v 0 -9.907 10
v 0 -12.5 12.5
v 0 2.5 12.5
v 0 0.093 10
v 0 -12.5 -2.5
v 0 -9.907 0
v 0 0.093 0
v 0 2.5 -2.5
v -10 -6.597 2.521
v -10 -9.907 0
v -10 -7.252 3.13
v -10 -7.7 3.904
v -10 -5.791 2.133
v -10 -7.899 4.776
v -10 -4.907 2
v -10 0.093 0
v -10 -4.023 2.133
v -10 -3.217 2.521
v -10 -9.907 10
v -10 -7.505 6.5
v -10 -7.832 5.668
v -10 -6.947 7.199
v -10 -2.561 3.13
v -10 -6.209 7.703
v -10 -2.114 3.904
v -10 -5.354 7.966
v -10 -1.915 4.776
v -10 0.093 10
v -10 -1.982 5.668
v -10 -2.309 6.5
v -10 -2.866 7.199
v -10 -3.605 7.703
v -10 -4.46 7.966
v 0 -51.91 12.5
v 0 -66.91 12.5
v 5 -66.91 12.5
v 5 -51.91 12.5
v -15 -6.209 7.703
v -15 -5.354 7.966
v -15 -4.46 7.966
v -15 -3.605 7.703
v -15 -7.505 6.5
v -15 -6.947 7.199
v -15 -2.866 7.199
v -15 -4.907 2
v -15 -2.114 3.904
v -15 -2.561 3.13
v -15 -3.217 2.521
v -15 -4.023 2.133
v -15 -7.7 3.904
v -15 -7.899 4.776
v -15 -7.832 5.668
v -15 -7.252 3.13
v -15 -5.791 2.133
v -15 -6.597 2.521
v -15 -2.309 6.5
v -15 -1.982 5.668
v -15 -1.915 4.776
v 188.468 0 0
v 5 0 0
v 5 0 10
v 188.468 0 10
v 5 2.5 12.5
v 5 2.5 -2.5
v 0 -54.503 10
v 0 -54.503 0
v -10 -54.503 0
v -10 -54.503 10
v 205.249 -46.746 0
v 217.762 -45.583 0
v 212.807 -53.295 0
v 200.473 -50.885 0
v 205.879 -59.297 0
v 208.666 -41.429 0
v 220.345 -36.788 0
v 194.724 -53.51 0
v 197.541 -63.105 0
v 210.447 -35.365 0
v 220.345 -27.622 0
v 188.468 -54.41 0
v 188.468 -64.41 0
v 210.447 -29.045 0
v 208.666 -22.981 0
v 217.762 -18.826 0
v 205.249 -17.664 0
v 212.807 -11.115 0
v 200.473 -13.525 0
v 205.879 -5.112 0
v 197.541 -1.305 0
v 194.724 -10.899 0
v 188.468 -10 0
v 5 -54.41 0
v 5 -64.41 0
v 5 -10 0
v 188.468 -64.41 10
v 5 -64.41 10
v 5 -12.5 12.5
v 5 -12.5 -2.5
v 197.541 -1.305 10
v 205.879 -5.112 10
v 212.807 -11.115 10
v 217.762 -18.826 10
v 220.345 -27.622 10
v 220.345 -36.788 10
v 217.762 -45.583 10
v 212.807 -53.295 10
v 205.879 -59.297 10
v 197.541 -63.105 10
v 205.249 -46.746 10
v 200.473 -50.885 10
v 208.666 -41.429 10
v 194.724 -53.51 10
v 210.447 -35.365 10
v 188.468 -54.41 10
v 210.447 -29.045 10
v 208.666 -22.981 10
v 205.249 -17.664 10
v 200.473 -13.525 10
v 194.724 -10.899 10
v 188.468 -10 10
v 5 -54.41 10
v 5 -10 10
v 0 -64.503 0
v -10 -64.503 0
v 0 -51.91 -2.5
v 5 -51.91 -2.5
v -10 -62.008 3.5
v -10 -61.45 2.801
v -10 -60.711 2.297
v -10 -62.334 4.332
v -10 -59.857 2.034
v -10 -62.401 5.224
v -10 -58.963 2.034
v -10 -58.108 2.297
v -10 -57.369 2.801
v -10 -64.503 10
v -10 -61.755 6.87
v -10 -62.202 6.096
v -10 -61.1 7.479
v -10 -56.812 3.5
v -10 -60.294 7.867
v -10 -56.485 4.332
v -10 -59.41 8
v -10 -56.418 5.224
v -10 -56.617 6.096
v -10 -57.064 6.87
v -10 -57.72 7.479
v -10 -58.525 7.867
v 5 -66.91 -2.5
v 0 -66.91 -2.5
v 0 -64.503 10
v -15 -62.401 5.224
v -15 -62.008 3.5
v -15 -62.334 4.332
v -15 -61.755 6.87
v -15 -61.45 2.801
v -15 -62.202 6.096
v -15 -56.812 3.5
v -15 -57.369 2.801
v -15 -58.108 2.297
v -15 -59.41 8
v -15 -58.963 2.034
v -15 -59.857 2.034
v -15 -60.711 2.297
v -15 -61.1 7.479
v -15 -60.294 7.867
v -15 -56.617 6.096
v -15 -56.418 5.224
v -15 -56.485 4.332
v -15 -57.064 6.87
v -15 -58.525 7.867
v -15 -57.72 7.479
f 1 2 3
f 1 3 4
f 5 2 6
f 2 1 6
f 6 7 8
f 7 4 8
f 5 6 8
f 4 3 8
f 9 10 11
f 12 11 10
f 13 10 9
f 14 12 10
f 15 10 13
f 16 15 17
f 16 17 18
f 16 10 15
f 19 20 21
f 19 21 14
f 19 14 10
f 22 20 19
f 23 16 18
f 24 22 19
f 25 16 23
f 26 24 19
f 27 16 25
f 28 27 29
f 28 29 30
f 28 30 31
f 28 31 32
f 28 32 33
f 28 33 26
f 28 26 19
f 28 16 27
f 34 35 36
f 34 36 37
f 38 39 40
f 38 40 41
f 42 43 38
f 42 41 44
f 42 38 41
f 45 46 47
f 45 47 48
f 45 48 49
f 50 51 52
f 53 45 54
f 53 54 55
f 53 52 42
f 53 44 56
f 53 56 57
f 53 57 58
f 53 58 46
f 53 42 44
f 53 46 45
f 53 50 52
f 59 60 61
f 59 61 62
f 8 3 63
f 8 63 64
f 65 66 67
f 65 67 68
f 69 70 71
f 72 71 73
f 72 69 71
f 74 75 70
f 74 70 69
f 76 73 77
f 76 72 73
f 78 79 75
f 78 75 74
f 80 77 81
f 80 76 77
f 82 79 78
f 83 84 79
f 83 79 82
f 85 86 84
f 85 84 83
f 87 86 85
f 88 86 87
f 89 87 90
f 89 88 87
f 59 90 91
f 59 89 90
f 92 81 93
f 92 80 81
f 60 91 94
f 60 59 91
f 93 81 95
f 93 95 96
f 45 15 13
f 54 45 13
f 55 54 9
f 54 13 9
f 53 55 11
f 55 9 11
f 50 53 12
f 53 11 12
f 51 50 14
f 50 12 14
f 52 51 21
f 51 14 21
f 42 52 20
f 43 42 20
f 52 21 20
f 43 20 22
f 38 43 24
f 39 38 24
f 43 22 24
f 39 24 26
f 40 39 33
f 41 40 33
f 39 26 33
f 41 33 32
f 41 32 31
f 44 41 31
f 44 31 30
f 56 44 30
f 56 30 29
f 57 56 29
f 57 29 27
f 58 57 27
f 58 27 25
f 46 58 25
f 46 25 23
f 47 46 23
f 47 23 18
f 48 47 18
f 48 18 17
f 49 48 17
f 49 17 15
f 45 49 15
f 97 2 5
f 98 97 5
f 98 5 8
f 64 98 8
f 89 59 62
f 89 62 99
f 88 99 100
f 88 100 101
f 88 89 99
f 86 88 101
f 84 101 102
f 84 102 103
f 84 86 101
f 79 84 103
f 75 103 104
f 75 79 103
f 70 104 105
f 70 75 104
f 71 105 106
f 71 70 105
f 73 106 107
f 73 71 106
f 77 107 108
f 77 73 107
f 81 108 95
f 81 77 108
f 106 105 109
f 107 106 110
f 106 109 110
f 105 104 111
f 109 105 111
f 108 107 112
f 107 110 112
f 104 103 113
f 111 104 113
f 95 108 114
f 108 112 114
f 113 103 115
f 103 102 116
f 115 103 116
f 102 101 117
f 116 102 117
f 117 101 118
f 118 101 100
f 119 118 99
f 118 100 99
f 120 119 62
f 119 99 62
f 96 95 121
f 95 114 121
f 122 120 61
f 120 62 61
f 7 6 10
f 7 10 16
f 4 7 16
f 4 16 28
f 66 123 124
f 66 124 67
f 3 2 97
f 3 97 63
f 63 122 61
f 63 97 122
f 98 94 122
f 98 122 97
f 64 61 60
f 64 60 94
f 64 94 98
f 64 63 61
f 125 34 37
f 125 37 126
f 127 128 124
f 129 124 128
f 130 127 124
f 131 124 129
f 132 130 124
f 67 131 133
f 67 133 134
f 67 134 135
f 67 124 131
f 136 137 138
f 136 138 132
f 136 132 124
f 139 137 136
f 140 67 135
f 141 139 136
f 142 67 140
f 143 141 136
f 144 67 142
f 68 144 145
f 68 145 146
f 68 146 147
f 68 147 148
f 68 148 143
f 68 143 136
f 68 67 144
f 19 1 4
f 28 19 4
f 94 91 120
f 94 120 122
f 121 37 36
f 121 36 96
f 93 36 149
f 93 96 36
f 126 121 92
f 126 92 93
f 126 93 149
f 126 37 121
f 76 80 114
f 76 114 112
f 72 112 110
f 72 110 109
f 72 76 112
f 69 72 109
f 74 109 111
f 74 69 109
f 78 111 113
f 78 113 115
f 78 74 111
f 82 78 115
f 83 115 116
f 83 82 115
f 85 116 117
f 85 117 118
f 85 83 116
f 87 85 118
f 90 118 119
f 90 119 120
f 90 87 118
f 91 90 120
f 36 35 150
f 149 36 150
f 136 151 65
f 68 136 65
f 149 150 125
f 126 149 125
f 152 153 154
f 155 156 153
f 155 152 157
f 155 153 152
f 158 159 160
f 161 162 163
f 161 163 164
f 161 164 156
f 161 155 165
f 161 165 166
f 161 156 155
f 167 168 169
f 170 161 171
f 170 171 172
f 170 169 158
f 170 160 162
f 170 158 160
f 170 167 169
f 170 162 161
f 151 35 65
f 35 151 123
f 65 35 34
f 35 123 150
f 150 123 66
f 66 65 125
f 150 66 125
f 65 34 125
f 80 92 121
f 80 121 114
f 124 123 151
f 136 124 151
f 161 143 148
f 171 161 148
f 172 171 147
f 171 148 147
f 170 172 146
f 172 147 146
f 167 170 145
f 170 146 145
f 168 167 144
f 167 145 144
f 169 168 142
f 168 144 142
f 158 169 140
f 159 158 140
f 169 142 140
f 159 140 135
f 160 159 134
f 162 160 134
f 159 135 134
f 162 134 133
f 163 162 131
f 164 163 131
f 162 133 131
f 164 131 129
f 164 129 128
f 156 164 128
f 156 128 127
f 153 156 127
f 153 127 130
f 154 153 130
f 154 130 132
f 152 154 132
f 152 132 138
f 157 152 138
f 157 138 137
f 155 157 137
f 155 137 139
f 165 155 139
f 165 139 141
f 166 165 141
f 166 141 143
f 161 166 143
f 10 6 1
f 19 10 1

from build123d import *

# Parameters (mm, degrees)
BOSS_EXTRUDE1_DEPTH   = 10
SKETCH2_R             = 3
BOSS_EXTRUDE2_DEPTH   = 15
SKETCH3_R             = 3
BOSS_EXTRUDE3_DEPTH   = 15
SKETCH5_W             = 15
SKETCH5_H             = 15
BOSS_EXTRUDE4_DEPTH   = 5
BOSS_EXTRUDE4_2_DEPTH = 5
SKETCH7_W             = 10
SKETCH7_H             = 10
BOSS_EXTRUDE5_DEPTH   = 10


with BuildPart() as part:
    # Sketch1 → Boss-Extrude1 (new body)
    with BuildSketch(Plane.XY):
        with BuildLine():
            Line((0, 0), (188.467924539, 0))
            ThreePointArc((188.467924539, 0), (220.672766762, -32.204842223), (188.467924539, -64.409684446))
            Line((188.467924539, -64.409684446), (0, -64.409684446))
            Line((0, -64.409684446), (0, -54.409684446))
            Line((0, -54.409684446), (188.467924539, -54.409684446))
            ThreePointArc((188.467924539, -54.409684446), (210.672766762, -32.204842223), (188.467924539, -10))
            Line((188.467924539, -10), (0, -10))
            Line((0, -10), (0, 0))
        make_face()
    extrude(amount=BOSS_EXTRUDE1_DEPTH)

    # Sketch2 → Boss-Extrude2 (add)
    with BuildSketch(Plane.ZY):
        with Locations(Location((5, -4.906979909, 0), (0, 0, 180))):
            Circle(SKETCH2_R)
    extrude(amount=BOSS_EXTRUDE2_DEPTH)



with BuildPart() as body_2:
    # Sketch3 → Boss-Extrude3 (new body)
    with BuildSketch(Plane.ZY):
        with Locations((5, -59.409684446)):
            Circle(SKETCH3_R)
    extrude(amount=BOSS_EXTRUDE3_DEPTH)


with BuildPart() as body_3:
    # Sketch5 → Boss-Extrude4 (new body)
    with BuildSketch(Plane(origin=(0, 0, 0), x_dir=(0, 0, -1), z_dir=(1, 0, 0))):
        with Locations((-5, -59.409684446)):
            Rectangle(SKETCH5_W, SKETCH5_H)
    extrude(amount=BOSS_EXTRUDE4_DEPTH)


with BuildPart() as body_4:
    # Sketch5 → Boss-Extrude4 2 (new body)
    with BuildSketch(Plane(origin=(0, 0, 0), x_dir=(0, 0, -1), z_dir=(1, 0, 0))):
        with Locations((-5, -5)):
            Rectangle(SKETCH5_W, SKETCH5_H)
    extrude(amount=BOSS_EXTRUDE4_2_DEPTH)


with BuildPart() as part_1:
    add(part.part)

    add(body_2.part)  # Boss-Extrude5 merges body 2

    add(body_3.part)  # Boss-Extrude5 merges body 3

    add(body_4.part)  # Boss-Extrude5 merges body 4
    # Sketch7 → Boss-Extrude5 (add)
    with BuildSketch(Plane.ZY):
        with Locations((5, -59.502704537)):
            Rectangle(SKETCH7_W, SKETCH7_H)
        with Locations((5, -4.906979909)):
            Rectangle(SKETCH7_W, SKETCH7_H)
    extrude(amount=BOSS_EXTRUDE5_DEPTH)


solid = part_1.part
